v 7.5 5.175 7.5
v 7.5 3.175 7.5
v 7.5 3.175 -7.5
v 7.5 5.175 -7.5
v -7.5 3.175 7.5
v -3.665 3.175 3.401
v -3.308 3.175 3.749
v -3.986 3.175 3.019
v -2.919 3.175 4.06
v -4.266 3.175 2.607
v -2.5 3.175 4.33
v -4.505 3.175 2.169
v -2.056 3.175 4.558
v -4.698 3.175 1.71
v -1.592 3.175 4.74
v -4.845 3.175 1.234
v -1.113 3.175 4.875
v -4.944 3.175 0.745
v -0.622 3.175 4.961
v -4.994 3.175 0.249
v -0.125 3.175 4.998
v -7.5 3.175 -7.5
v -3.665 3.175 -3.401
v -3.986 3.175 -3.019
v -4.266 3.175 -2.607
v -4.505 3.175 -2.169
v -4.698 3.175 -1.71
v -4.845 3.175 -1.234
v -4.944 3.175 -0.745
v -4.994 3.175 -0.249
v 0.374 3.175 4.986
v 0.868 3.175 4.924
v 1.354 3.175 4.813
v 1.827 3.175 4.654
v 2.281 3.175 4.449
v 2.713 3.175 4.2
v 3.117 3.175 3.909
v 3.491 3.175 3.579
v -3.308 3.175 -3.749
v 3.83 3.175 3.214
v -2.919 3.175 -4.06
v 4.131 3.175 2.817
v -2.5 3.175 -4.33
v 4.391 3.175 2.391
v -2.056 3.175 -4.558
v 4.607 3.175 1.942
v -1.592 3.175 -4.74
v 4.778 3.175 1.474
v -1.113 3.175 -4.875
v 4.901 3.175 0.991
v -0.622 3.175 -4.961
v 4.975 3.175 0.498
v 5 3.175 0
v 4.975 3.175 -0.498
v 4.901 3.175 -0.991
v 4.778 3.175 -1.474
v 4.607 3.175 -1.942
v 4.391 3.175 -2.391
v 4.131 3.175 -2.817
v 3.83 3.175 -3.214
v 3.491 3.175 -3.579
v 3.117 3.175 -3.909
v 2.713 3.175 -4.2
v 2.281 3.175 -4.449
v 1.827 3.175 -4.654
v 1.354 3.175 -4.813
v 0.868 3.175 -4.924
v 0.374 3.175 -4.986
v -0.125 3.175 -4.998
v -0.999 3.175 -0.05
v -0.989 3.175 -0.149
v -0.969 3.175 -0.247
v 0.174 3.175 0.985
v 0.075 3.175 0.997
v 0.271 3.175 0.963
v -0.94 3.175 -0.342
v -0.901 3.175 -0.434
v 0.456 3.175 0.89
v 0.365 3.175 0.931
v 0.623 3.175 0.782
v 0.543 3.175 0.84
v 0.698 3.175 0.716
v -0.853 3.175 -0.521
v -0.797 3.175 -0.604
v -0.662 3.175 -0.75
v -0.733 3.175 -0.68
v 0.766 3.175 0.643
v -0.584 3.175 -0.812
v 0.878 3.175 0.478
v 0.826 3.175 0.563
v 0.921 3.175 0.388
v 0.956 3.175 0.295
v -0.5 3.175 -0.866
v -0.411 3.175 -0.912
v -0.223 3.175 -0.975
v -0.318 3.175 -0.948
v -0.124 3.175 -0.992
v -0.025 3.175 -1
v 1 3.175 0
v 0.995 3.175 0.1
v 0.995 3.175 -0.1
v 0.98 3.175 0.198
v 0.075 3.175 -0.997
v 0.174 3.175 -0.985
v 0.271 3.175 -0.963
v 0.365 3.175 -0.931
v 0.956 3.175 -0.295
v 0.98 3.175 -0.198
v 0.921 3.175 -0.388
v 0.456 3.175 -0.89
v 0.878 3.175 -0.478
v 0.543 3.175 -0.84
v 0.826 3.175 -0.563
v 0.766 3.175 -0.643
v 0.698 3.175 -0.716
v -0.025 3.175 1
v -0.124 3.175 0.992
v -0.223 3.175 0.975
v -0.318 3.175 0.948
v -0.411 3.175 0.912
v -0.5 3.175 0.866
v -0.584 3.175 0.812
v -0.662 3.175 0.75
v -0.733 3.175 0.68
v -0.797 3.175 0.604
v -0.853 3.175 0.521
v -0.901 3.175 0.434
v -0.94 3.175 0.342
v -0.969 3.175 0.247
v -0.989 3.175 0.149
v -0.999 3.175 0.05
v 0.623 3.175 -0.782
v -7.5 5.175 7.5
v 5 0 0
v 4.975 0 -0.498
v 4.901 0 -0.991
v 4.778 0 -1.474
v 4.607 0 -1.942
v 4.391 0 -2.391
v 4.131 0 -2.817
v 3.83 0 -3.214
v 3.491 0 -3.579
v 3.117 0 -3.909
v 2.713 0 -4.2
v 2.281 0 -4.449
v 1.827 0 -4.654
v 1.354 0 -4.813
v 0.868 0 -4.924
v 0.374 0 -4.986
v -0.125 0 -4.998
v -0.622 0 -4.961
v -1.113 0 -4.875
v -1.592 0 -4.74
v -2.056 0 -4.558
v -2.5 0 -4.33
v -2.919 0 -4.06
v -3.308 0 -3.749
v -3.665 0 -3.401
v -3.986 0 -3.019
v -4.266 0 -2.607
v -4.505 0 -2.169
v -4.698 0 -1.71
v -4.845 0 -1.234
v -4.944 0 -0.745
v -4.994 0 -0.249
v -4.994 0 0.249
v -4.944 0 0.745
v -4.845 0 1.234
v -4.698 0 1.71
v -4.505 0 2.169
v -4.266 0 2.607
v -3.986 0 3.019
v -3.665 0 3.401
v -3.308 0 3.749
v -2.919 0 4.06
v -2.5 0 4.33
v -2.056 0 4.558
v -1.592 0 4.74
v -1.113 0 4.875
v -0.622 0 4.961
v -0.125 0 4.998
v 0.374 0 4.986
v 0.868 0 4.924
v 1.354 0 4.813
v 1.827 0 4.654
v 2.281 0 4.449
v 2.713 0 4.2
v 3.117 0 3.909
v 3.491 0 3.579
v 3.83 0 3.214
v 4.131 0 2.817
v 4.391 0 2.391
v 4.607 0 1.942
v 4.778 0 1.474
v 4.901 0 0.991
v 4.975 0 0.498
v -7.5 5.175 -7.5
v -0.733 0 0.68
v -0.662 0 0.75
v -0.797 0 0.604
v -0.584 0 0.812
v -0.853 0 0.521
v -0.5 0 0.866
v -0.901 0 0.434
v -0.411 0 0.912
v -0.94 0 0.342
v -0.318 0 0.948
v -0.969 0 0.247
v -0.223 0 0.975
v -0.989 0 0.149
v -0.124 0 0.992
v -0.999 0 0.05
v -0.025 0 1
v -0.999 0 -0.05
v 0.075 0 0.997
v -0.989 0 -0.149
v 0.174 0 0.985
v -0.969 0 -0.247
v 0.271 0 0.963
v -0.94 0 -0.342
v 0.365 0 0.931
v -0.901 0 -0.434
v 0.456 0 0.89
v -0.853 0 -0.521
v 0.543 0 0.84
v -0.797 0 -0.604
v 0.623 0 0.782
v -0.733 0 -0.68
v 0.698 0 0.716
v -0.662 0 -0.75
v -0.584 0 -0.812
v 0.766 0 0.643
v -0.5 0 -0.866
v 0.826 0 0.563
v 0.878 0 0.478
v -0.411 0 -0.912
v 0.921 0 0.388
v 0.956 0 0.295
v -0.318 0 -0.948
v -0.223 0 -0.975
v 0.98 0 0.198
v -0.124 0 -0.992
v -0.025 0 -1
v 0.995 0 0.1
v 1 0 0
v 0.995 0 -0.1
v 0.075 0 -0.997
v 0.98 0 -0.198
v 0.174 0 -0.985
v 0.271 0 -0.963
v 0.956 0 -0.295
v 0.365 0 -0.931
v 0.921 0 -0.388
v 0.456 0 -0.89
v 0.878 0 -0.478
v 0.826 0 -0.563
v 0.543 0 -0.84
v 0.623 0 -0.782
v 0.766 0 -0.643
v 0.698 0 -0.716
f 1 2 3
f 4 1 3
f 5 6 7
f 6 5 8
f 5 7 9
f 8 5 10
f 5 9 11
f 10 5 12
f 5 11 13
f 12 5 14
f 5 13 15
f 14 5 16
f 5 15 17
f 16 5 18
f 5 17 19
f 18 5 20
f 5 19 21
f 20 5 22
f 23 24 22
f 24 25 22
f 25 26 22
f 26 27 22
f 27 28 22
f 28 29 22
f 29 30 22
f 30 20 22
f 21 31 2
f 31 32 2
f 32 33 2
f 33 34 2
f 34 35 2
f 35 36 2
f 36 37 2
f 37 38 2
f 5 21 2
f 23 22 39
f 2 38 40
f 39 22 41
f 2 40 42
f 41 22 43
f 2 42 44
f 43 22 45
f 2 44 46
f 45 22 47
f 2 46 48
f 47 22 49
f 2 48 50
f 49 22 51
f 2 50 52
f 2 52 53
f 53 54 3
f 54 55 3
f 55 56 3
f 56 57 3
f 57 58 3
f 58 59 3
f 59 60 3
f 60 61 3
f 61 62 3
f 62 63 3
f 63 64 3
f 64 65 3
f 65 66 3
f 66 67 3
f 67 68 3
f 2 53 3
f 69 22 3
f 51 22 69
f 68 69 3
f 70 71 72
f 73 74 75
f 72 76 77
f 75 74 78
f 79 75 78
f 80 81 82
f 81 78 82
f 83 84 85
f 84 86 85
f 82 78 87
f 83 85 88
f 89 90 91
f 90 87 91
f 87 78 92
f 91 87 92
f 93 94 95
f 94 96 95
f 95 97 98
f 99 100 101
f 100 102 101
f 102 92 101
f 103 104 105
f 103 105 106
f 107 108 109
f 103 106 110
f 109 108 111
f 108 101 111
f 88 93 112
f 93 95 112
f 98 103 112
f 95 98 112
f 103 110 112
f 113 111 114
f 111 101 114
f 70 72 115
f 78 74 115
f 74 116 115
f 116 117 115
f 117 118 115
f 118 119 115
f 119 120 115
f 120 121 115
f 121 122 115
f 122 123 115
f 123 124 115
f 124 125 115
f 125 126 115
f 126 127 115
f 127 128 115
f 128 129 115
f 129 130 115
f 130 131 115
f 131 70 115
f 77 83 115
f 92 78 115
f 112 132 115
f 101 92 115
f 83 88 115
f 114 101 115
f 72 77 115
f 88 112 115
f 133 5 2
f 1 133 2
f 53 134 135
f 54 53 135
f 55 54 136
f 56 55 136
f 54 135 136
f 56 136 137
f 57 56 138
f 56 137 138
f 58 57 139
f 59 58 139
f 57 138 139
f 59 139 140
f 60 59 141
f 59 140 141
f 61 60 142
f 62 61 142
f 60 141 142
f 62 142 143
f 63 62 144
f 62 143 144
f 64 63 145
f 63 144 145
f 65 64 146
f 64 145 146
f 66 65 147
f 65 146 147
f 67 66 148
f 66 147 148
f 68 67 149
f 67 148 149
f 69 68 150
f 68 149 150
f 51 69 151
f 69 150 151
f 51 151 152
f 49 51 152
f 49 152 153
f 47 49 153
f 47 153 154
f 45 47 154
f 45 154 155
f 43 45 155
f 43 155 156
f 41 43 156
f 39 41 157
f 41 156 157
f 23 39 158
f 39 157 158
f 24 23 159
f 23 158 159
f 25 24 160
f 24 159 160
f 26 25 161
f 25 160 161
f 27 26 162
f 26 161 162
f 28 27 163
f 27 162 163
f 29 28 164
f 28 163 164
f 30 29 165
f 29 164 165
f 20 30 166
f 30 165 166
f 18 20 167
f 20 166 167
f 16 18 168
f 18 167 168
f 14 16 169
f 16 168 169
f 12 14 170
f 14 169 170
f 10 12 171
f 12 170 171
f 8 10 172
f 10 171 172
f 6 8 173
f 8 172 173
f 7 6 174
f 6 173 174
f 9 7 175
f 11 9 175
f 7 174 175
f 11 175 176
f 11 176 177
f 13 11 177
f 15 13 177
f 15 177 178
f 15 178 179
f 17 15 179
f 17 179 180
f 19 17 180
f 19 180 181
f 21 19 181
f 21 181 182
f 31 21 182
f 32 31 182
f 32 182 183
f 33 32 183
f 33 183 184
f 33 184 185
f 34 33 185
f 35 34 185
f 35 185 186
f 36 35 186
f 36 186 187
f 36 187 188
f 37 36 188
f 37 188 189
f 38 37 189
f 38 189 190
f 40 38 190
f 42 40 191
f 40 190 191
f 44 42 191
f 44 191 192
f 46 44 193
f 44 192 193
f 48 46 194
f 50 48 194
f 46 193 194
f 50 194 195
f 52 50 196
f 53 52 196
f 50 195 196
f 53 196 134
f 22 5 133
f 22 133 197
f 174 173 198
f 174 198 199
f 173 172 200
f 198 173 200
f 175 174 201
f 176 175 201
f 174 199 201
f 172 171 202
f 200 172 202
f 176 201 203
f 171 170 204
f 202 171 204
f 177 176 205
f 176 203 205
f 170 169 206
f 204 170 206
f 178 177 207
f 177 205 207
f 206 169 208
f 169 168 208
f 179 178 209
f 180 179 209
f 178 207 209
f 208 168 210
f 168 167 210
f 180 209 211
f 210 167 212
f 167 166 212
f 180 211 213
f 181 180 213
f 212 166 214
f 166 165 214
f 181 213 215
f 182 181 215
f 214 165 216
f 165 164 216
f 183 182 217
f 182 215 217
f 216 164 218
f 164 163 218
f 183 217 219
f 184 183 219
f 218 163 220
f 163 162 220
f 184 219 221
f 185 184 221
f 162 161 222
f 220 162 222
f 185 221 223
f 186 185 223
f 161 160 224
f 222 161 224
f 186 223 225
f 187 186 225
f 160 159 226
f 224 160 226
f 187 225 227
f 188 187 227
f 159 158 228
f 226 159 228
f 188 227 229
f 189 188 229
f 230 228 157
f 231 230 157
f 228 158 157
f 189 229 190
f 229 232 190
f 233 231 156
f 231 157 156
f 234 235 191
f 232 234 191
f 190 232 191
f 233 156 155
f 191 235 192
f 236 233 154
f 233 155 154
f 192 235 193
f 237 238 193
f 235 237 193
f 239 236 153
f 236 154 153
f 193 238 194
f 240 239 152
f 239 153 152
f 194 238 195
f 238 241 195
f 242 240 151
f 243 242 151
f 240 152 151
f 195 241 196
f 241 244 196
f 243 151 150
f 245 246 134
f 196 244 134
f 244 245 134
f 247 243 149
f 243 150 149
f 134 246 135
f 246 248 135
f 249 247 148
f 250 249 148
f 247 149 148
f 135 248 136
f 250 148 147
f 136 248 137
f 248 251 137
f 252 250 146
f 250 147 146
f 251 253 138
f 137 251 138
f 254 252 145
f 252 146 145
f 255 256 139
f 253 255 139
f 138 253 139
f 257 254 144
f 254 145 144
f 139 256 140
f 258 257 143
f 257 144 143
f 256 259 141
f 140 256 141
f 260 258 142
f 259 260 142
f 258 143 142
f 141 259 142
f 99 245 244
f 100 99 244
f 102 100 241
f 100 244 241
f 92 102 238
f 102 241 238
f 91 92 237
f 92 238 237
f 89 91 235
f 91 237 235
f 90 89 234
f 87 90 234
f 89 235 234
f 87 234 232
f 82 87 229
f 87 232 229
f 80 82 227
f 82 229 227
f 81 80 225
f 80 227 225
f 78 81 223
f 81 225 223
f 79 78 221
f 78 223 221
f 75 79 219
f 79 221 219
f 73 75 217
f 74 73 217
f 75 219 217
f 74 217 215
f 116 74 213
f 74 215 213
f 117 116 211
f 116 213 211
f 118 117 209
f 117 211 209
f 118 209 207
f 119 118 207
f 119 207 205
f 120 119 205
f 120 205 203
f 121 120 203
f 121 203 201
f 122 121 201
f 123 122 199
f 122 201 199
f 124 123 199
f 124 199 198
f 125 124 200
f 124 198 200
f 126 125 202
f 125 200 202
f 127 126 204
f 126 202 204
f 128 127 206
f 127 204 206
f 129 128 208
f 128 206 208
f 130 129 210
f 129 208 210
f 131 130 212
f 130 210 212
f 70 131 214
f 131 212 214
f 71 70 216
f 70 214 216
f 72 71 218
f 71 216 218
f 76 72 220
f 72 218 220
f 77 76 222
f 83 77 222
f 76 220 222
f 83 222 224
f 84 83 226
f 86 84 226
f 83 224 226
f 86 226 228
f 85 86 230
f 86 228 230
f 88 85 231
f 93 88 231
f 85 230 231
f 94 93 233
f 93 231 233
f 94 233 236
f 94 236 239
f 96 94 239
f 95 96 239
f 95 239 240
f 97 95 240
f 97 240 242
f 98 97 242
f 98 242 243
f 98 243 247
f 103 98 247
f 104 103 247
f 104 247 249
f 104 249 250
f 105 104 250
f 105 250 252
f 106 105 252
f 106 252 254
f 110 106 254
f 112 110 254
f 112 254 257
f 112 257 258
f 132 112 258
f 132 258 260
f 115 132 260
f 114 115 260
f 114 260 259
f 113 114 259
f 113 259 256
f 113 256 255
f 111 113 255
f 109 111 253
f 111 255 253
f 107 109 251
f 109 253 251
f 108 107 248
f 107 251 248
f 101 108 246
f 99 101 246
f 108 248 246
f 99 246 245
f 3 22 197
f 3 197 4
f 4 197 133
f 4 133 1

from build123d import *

# Parameters (mm, degrees)
SKETCH1_R           = 5
BOSS_EXTRUDE1_DEPTH = 3.175
SKETCH2_R           = 1
CUT_EXTRUDE1_DEPTH  = 3.175
SKETCH3_W           = 15
SKETCH3_H           = 15
BOSS_EXTRUDE2_DEPTH = 2


with BuildPart() as part:
    # Sketch1 → Boss-Extrude1 (new body)
    with BuildSketch(Plane(origin=(0, 0, 0), x_dir=(1, 0, 0), z_dir=(0, 1, 0))):
        Circle(SKETCH1_R)
    extrude(amount=BOSS_EXTRUDE1_DEPTH)

    # Sketch2 → Cut-Extrude1 (cut)
    with BuildSketch(Plane.XZ):
        Circle(SKETCH2_R)
    extrude(amount=-CUT_EXTRUDE1_DEPTH, mode=Mode.SUBTRACT)

    # Sketch3 → Boss-Extrude2 (add)
    with BuildSketch(Plane(origin=(0, 3.175, 0), x_dir=(1, 0, 0), z_dir=(0, 1, 0))):
        Rectangle(SKETCH3_W, SKETCH3_H)
    extrude(amount=BOSS_EXTRUDE2_DEPTH)


solid = part.part
